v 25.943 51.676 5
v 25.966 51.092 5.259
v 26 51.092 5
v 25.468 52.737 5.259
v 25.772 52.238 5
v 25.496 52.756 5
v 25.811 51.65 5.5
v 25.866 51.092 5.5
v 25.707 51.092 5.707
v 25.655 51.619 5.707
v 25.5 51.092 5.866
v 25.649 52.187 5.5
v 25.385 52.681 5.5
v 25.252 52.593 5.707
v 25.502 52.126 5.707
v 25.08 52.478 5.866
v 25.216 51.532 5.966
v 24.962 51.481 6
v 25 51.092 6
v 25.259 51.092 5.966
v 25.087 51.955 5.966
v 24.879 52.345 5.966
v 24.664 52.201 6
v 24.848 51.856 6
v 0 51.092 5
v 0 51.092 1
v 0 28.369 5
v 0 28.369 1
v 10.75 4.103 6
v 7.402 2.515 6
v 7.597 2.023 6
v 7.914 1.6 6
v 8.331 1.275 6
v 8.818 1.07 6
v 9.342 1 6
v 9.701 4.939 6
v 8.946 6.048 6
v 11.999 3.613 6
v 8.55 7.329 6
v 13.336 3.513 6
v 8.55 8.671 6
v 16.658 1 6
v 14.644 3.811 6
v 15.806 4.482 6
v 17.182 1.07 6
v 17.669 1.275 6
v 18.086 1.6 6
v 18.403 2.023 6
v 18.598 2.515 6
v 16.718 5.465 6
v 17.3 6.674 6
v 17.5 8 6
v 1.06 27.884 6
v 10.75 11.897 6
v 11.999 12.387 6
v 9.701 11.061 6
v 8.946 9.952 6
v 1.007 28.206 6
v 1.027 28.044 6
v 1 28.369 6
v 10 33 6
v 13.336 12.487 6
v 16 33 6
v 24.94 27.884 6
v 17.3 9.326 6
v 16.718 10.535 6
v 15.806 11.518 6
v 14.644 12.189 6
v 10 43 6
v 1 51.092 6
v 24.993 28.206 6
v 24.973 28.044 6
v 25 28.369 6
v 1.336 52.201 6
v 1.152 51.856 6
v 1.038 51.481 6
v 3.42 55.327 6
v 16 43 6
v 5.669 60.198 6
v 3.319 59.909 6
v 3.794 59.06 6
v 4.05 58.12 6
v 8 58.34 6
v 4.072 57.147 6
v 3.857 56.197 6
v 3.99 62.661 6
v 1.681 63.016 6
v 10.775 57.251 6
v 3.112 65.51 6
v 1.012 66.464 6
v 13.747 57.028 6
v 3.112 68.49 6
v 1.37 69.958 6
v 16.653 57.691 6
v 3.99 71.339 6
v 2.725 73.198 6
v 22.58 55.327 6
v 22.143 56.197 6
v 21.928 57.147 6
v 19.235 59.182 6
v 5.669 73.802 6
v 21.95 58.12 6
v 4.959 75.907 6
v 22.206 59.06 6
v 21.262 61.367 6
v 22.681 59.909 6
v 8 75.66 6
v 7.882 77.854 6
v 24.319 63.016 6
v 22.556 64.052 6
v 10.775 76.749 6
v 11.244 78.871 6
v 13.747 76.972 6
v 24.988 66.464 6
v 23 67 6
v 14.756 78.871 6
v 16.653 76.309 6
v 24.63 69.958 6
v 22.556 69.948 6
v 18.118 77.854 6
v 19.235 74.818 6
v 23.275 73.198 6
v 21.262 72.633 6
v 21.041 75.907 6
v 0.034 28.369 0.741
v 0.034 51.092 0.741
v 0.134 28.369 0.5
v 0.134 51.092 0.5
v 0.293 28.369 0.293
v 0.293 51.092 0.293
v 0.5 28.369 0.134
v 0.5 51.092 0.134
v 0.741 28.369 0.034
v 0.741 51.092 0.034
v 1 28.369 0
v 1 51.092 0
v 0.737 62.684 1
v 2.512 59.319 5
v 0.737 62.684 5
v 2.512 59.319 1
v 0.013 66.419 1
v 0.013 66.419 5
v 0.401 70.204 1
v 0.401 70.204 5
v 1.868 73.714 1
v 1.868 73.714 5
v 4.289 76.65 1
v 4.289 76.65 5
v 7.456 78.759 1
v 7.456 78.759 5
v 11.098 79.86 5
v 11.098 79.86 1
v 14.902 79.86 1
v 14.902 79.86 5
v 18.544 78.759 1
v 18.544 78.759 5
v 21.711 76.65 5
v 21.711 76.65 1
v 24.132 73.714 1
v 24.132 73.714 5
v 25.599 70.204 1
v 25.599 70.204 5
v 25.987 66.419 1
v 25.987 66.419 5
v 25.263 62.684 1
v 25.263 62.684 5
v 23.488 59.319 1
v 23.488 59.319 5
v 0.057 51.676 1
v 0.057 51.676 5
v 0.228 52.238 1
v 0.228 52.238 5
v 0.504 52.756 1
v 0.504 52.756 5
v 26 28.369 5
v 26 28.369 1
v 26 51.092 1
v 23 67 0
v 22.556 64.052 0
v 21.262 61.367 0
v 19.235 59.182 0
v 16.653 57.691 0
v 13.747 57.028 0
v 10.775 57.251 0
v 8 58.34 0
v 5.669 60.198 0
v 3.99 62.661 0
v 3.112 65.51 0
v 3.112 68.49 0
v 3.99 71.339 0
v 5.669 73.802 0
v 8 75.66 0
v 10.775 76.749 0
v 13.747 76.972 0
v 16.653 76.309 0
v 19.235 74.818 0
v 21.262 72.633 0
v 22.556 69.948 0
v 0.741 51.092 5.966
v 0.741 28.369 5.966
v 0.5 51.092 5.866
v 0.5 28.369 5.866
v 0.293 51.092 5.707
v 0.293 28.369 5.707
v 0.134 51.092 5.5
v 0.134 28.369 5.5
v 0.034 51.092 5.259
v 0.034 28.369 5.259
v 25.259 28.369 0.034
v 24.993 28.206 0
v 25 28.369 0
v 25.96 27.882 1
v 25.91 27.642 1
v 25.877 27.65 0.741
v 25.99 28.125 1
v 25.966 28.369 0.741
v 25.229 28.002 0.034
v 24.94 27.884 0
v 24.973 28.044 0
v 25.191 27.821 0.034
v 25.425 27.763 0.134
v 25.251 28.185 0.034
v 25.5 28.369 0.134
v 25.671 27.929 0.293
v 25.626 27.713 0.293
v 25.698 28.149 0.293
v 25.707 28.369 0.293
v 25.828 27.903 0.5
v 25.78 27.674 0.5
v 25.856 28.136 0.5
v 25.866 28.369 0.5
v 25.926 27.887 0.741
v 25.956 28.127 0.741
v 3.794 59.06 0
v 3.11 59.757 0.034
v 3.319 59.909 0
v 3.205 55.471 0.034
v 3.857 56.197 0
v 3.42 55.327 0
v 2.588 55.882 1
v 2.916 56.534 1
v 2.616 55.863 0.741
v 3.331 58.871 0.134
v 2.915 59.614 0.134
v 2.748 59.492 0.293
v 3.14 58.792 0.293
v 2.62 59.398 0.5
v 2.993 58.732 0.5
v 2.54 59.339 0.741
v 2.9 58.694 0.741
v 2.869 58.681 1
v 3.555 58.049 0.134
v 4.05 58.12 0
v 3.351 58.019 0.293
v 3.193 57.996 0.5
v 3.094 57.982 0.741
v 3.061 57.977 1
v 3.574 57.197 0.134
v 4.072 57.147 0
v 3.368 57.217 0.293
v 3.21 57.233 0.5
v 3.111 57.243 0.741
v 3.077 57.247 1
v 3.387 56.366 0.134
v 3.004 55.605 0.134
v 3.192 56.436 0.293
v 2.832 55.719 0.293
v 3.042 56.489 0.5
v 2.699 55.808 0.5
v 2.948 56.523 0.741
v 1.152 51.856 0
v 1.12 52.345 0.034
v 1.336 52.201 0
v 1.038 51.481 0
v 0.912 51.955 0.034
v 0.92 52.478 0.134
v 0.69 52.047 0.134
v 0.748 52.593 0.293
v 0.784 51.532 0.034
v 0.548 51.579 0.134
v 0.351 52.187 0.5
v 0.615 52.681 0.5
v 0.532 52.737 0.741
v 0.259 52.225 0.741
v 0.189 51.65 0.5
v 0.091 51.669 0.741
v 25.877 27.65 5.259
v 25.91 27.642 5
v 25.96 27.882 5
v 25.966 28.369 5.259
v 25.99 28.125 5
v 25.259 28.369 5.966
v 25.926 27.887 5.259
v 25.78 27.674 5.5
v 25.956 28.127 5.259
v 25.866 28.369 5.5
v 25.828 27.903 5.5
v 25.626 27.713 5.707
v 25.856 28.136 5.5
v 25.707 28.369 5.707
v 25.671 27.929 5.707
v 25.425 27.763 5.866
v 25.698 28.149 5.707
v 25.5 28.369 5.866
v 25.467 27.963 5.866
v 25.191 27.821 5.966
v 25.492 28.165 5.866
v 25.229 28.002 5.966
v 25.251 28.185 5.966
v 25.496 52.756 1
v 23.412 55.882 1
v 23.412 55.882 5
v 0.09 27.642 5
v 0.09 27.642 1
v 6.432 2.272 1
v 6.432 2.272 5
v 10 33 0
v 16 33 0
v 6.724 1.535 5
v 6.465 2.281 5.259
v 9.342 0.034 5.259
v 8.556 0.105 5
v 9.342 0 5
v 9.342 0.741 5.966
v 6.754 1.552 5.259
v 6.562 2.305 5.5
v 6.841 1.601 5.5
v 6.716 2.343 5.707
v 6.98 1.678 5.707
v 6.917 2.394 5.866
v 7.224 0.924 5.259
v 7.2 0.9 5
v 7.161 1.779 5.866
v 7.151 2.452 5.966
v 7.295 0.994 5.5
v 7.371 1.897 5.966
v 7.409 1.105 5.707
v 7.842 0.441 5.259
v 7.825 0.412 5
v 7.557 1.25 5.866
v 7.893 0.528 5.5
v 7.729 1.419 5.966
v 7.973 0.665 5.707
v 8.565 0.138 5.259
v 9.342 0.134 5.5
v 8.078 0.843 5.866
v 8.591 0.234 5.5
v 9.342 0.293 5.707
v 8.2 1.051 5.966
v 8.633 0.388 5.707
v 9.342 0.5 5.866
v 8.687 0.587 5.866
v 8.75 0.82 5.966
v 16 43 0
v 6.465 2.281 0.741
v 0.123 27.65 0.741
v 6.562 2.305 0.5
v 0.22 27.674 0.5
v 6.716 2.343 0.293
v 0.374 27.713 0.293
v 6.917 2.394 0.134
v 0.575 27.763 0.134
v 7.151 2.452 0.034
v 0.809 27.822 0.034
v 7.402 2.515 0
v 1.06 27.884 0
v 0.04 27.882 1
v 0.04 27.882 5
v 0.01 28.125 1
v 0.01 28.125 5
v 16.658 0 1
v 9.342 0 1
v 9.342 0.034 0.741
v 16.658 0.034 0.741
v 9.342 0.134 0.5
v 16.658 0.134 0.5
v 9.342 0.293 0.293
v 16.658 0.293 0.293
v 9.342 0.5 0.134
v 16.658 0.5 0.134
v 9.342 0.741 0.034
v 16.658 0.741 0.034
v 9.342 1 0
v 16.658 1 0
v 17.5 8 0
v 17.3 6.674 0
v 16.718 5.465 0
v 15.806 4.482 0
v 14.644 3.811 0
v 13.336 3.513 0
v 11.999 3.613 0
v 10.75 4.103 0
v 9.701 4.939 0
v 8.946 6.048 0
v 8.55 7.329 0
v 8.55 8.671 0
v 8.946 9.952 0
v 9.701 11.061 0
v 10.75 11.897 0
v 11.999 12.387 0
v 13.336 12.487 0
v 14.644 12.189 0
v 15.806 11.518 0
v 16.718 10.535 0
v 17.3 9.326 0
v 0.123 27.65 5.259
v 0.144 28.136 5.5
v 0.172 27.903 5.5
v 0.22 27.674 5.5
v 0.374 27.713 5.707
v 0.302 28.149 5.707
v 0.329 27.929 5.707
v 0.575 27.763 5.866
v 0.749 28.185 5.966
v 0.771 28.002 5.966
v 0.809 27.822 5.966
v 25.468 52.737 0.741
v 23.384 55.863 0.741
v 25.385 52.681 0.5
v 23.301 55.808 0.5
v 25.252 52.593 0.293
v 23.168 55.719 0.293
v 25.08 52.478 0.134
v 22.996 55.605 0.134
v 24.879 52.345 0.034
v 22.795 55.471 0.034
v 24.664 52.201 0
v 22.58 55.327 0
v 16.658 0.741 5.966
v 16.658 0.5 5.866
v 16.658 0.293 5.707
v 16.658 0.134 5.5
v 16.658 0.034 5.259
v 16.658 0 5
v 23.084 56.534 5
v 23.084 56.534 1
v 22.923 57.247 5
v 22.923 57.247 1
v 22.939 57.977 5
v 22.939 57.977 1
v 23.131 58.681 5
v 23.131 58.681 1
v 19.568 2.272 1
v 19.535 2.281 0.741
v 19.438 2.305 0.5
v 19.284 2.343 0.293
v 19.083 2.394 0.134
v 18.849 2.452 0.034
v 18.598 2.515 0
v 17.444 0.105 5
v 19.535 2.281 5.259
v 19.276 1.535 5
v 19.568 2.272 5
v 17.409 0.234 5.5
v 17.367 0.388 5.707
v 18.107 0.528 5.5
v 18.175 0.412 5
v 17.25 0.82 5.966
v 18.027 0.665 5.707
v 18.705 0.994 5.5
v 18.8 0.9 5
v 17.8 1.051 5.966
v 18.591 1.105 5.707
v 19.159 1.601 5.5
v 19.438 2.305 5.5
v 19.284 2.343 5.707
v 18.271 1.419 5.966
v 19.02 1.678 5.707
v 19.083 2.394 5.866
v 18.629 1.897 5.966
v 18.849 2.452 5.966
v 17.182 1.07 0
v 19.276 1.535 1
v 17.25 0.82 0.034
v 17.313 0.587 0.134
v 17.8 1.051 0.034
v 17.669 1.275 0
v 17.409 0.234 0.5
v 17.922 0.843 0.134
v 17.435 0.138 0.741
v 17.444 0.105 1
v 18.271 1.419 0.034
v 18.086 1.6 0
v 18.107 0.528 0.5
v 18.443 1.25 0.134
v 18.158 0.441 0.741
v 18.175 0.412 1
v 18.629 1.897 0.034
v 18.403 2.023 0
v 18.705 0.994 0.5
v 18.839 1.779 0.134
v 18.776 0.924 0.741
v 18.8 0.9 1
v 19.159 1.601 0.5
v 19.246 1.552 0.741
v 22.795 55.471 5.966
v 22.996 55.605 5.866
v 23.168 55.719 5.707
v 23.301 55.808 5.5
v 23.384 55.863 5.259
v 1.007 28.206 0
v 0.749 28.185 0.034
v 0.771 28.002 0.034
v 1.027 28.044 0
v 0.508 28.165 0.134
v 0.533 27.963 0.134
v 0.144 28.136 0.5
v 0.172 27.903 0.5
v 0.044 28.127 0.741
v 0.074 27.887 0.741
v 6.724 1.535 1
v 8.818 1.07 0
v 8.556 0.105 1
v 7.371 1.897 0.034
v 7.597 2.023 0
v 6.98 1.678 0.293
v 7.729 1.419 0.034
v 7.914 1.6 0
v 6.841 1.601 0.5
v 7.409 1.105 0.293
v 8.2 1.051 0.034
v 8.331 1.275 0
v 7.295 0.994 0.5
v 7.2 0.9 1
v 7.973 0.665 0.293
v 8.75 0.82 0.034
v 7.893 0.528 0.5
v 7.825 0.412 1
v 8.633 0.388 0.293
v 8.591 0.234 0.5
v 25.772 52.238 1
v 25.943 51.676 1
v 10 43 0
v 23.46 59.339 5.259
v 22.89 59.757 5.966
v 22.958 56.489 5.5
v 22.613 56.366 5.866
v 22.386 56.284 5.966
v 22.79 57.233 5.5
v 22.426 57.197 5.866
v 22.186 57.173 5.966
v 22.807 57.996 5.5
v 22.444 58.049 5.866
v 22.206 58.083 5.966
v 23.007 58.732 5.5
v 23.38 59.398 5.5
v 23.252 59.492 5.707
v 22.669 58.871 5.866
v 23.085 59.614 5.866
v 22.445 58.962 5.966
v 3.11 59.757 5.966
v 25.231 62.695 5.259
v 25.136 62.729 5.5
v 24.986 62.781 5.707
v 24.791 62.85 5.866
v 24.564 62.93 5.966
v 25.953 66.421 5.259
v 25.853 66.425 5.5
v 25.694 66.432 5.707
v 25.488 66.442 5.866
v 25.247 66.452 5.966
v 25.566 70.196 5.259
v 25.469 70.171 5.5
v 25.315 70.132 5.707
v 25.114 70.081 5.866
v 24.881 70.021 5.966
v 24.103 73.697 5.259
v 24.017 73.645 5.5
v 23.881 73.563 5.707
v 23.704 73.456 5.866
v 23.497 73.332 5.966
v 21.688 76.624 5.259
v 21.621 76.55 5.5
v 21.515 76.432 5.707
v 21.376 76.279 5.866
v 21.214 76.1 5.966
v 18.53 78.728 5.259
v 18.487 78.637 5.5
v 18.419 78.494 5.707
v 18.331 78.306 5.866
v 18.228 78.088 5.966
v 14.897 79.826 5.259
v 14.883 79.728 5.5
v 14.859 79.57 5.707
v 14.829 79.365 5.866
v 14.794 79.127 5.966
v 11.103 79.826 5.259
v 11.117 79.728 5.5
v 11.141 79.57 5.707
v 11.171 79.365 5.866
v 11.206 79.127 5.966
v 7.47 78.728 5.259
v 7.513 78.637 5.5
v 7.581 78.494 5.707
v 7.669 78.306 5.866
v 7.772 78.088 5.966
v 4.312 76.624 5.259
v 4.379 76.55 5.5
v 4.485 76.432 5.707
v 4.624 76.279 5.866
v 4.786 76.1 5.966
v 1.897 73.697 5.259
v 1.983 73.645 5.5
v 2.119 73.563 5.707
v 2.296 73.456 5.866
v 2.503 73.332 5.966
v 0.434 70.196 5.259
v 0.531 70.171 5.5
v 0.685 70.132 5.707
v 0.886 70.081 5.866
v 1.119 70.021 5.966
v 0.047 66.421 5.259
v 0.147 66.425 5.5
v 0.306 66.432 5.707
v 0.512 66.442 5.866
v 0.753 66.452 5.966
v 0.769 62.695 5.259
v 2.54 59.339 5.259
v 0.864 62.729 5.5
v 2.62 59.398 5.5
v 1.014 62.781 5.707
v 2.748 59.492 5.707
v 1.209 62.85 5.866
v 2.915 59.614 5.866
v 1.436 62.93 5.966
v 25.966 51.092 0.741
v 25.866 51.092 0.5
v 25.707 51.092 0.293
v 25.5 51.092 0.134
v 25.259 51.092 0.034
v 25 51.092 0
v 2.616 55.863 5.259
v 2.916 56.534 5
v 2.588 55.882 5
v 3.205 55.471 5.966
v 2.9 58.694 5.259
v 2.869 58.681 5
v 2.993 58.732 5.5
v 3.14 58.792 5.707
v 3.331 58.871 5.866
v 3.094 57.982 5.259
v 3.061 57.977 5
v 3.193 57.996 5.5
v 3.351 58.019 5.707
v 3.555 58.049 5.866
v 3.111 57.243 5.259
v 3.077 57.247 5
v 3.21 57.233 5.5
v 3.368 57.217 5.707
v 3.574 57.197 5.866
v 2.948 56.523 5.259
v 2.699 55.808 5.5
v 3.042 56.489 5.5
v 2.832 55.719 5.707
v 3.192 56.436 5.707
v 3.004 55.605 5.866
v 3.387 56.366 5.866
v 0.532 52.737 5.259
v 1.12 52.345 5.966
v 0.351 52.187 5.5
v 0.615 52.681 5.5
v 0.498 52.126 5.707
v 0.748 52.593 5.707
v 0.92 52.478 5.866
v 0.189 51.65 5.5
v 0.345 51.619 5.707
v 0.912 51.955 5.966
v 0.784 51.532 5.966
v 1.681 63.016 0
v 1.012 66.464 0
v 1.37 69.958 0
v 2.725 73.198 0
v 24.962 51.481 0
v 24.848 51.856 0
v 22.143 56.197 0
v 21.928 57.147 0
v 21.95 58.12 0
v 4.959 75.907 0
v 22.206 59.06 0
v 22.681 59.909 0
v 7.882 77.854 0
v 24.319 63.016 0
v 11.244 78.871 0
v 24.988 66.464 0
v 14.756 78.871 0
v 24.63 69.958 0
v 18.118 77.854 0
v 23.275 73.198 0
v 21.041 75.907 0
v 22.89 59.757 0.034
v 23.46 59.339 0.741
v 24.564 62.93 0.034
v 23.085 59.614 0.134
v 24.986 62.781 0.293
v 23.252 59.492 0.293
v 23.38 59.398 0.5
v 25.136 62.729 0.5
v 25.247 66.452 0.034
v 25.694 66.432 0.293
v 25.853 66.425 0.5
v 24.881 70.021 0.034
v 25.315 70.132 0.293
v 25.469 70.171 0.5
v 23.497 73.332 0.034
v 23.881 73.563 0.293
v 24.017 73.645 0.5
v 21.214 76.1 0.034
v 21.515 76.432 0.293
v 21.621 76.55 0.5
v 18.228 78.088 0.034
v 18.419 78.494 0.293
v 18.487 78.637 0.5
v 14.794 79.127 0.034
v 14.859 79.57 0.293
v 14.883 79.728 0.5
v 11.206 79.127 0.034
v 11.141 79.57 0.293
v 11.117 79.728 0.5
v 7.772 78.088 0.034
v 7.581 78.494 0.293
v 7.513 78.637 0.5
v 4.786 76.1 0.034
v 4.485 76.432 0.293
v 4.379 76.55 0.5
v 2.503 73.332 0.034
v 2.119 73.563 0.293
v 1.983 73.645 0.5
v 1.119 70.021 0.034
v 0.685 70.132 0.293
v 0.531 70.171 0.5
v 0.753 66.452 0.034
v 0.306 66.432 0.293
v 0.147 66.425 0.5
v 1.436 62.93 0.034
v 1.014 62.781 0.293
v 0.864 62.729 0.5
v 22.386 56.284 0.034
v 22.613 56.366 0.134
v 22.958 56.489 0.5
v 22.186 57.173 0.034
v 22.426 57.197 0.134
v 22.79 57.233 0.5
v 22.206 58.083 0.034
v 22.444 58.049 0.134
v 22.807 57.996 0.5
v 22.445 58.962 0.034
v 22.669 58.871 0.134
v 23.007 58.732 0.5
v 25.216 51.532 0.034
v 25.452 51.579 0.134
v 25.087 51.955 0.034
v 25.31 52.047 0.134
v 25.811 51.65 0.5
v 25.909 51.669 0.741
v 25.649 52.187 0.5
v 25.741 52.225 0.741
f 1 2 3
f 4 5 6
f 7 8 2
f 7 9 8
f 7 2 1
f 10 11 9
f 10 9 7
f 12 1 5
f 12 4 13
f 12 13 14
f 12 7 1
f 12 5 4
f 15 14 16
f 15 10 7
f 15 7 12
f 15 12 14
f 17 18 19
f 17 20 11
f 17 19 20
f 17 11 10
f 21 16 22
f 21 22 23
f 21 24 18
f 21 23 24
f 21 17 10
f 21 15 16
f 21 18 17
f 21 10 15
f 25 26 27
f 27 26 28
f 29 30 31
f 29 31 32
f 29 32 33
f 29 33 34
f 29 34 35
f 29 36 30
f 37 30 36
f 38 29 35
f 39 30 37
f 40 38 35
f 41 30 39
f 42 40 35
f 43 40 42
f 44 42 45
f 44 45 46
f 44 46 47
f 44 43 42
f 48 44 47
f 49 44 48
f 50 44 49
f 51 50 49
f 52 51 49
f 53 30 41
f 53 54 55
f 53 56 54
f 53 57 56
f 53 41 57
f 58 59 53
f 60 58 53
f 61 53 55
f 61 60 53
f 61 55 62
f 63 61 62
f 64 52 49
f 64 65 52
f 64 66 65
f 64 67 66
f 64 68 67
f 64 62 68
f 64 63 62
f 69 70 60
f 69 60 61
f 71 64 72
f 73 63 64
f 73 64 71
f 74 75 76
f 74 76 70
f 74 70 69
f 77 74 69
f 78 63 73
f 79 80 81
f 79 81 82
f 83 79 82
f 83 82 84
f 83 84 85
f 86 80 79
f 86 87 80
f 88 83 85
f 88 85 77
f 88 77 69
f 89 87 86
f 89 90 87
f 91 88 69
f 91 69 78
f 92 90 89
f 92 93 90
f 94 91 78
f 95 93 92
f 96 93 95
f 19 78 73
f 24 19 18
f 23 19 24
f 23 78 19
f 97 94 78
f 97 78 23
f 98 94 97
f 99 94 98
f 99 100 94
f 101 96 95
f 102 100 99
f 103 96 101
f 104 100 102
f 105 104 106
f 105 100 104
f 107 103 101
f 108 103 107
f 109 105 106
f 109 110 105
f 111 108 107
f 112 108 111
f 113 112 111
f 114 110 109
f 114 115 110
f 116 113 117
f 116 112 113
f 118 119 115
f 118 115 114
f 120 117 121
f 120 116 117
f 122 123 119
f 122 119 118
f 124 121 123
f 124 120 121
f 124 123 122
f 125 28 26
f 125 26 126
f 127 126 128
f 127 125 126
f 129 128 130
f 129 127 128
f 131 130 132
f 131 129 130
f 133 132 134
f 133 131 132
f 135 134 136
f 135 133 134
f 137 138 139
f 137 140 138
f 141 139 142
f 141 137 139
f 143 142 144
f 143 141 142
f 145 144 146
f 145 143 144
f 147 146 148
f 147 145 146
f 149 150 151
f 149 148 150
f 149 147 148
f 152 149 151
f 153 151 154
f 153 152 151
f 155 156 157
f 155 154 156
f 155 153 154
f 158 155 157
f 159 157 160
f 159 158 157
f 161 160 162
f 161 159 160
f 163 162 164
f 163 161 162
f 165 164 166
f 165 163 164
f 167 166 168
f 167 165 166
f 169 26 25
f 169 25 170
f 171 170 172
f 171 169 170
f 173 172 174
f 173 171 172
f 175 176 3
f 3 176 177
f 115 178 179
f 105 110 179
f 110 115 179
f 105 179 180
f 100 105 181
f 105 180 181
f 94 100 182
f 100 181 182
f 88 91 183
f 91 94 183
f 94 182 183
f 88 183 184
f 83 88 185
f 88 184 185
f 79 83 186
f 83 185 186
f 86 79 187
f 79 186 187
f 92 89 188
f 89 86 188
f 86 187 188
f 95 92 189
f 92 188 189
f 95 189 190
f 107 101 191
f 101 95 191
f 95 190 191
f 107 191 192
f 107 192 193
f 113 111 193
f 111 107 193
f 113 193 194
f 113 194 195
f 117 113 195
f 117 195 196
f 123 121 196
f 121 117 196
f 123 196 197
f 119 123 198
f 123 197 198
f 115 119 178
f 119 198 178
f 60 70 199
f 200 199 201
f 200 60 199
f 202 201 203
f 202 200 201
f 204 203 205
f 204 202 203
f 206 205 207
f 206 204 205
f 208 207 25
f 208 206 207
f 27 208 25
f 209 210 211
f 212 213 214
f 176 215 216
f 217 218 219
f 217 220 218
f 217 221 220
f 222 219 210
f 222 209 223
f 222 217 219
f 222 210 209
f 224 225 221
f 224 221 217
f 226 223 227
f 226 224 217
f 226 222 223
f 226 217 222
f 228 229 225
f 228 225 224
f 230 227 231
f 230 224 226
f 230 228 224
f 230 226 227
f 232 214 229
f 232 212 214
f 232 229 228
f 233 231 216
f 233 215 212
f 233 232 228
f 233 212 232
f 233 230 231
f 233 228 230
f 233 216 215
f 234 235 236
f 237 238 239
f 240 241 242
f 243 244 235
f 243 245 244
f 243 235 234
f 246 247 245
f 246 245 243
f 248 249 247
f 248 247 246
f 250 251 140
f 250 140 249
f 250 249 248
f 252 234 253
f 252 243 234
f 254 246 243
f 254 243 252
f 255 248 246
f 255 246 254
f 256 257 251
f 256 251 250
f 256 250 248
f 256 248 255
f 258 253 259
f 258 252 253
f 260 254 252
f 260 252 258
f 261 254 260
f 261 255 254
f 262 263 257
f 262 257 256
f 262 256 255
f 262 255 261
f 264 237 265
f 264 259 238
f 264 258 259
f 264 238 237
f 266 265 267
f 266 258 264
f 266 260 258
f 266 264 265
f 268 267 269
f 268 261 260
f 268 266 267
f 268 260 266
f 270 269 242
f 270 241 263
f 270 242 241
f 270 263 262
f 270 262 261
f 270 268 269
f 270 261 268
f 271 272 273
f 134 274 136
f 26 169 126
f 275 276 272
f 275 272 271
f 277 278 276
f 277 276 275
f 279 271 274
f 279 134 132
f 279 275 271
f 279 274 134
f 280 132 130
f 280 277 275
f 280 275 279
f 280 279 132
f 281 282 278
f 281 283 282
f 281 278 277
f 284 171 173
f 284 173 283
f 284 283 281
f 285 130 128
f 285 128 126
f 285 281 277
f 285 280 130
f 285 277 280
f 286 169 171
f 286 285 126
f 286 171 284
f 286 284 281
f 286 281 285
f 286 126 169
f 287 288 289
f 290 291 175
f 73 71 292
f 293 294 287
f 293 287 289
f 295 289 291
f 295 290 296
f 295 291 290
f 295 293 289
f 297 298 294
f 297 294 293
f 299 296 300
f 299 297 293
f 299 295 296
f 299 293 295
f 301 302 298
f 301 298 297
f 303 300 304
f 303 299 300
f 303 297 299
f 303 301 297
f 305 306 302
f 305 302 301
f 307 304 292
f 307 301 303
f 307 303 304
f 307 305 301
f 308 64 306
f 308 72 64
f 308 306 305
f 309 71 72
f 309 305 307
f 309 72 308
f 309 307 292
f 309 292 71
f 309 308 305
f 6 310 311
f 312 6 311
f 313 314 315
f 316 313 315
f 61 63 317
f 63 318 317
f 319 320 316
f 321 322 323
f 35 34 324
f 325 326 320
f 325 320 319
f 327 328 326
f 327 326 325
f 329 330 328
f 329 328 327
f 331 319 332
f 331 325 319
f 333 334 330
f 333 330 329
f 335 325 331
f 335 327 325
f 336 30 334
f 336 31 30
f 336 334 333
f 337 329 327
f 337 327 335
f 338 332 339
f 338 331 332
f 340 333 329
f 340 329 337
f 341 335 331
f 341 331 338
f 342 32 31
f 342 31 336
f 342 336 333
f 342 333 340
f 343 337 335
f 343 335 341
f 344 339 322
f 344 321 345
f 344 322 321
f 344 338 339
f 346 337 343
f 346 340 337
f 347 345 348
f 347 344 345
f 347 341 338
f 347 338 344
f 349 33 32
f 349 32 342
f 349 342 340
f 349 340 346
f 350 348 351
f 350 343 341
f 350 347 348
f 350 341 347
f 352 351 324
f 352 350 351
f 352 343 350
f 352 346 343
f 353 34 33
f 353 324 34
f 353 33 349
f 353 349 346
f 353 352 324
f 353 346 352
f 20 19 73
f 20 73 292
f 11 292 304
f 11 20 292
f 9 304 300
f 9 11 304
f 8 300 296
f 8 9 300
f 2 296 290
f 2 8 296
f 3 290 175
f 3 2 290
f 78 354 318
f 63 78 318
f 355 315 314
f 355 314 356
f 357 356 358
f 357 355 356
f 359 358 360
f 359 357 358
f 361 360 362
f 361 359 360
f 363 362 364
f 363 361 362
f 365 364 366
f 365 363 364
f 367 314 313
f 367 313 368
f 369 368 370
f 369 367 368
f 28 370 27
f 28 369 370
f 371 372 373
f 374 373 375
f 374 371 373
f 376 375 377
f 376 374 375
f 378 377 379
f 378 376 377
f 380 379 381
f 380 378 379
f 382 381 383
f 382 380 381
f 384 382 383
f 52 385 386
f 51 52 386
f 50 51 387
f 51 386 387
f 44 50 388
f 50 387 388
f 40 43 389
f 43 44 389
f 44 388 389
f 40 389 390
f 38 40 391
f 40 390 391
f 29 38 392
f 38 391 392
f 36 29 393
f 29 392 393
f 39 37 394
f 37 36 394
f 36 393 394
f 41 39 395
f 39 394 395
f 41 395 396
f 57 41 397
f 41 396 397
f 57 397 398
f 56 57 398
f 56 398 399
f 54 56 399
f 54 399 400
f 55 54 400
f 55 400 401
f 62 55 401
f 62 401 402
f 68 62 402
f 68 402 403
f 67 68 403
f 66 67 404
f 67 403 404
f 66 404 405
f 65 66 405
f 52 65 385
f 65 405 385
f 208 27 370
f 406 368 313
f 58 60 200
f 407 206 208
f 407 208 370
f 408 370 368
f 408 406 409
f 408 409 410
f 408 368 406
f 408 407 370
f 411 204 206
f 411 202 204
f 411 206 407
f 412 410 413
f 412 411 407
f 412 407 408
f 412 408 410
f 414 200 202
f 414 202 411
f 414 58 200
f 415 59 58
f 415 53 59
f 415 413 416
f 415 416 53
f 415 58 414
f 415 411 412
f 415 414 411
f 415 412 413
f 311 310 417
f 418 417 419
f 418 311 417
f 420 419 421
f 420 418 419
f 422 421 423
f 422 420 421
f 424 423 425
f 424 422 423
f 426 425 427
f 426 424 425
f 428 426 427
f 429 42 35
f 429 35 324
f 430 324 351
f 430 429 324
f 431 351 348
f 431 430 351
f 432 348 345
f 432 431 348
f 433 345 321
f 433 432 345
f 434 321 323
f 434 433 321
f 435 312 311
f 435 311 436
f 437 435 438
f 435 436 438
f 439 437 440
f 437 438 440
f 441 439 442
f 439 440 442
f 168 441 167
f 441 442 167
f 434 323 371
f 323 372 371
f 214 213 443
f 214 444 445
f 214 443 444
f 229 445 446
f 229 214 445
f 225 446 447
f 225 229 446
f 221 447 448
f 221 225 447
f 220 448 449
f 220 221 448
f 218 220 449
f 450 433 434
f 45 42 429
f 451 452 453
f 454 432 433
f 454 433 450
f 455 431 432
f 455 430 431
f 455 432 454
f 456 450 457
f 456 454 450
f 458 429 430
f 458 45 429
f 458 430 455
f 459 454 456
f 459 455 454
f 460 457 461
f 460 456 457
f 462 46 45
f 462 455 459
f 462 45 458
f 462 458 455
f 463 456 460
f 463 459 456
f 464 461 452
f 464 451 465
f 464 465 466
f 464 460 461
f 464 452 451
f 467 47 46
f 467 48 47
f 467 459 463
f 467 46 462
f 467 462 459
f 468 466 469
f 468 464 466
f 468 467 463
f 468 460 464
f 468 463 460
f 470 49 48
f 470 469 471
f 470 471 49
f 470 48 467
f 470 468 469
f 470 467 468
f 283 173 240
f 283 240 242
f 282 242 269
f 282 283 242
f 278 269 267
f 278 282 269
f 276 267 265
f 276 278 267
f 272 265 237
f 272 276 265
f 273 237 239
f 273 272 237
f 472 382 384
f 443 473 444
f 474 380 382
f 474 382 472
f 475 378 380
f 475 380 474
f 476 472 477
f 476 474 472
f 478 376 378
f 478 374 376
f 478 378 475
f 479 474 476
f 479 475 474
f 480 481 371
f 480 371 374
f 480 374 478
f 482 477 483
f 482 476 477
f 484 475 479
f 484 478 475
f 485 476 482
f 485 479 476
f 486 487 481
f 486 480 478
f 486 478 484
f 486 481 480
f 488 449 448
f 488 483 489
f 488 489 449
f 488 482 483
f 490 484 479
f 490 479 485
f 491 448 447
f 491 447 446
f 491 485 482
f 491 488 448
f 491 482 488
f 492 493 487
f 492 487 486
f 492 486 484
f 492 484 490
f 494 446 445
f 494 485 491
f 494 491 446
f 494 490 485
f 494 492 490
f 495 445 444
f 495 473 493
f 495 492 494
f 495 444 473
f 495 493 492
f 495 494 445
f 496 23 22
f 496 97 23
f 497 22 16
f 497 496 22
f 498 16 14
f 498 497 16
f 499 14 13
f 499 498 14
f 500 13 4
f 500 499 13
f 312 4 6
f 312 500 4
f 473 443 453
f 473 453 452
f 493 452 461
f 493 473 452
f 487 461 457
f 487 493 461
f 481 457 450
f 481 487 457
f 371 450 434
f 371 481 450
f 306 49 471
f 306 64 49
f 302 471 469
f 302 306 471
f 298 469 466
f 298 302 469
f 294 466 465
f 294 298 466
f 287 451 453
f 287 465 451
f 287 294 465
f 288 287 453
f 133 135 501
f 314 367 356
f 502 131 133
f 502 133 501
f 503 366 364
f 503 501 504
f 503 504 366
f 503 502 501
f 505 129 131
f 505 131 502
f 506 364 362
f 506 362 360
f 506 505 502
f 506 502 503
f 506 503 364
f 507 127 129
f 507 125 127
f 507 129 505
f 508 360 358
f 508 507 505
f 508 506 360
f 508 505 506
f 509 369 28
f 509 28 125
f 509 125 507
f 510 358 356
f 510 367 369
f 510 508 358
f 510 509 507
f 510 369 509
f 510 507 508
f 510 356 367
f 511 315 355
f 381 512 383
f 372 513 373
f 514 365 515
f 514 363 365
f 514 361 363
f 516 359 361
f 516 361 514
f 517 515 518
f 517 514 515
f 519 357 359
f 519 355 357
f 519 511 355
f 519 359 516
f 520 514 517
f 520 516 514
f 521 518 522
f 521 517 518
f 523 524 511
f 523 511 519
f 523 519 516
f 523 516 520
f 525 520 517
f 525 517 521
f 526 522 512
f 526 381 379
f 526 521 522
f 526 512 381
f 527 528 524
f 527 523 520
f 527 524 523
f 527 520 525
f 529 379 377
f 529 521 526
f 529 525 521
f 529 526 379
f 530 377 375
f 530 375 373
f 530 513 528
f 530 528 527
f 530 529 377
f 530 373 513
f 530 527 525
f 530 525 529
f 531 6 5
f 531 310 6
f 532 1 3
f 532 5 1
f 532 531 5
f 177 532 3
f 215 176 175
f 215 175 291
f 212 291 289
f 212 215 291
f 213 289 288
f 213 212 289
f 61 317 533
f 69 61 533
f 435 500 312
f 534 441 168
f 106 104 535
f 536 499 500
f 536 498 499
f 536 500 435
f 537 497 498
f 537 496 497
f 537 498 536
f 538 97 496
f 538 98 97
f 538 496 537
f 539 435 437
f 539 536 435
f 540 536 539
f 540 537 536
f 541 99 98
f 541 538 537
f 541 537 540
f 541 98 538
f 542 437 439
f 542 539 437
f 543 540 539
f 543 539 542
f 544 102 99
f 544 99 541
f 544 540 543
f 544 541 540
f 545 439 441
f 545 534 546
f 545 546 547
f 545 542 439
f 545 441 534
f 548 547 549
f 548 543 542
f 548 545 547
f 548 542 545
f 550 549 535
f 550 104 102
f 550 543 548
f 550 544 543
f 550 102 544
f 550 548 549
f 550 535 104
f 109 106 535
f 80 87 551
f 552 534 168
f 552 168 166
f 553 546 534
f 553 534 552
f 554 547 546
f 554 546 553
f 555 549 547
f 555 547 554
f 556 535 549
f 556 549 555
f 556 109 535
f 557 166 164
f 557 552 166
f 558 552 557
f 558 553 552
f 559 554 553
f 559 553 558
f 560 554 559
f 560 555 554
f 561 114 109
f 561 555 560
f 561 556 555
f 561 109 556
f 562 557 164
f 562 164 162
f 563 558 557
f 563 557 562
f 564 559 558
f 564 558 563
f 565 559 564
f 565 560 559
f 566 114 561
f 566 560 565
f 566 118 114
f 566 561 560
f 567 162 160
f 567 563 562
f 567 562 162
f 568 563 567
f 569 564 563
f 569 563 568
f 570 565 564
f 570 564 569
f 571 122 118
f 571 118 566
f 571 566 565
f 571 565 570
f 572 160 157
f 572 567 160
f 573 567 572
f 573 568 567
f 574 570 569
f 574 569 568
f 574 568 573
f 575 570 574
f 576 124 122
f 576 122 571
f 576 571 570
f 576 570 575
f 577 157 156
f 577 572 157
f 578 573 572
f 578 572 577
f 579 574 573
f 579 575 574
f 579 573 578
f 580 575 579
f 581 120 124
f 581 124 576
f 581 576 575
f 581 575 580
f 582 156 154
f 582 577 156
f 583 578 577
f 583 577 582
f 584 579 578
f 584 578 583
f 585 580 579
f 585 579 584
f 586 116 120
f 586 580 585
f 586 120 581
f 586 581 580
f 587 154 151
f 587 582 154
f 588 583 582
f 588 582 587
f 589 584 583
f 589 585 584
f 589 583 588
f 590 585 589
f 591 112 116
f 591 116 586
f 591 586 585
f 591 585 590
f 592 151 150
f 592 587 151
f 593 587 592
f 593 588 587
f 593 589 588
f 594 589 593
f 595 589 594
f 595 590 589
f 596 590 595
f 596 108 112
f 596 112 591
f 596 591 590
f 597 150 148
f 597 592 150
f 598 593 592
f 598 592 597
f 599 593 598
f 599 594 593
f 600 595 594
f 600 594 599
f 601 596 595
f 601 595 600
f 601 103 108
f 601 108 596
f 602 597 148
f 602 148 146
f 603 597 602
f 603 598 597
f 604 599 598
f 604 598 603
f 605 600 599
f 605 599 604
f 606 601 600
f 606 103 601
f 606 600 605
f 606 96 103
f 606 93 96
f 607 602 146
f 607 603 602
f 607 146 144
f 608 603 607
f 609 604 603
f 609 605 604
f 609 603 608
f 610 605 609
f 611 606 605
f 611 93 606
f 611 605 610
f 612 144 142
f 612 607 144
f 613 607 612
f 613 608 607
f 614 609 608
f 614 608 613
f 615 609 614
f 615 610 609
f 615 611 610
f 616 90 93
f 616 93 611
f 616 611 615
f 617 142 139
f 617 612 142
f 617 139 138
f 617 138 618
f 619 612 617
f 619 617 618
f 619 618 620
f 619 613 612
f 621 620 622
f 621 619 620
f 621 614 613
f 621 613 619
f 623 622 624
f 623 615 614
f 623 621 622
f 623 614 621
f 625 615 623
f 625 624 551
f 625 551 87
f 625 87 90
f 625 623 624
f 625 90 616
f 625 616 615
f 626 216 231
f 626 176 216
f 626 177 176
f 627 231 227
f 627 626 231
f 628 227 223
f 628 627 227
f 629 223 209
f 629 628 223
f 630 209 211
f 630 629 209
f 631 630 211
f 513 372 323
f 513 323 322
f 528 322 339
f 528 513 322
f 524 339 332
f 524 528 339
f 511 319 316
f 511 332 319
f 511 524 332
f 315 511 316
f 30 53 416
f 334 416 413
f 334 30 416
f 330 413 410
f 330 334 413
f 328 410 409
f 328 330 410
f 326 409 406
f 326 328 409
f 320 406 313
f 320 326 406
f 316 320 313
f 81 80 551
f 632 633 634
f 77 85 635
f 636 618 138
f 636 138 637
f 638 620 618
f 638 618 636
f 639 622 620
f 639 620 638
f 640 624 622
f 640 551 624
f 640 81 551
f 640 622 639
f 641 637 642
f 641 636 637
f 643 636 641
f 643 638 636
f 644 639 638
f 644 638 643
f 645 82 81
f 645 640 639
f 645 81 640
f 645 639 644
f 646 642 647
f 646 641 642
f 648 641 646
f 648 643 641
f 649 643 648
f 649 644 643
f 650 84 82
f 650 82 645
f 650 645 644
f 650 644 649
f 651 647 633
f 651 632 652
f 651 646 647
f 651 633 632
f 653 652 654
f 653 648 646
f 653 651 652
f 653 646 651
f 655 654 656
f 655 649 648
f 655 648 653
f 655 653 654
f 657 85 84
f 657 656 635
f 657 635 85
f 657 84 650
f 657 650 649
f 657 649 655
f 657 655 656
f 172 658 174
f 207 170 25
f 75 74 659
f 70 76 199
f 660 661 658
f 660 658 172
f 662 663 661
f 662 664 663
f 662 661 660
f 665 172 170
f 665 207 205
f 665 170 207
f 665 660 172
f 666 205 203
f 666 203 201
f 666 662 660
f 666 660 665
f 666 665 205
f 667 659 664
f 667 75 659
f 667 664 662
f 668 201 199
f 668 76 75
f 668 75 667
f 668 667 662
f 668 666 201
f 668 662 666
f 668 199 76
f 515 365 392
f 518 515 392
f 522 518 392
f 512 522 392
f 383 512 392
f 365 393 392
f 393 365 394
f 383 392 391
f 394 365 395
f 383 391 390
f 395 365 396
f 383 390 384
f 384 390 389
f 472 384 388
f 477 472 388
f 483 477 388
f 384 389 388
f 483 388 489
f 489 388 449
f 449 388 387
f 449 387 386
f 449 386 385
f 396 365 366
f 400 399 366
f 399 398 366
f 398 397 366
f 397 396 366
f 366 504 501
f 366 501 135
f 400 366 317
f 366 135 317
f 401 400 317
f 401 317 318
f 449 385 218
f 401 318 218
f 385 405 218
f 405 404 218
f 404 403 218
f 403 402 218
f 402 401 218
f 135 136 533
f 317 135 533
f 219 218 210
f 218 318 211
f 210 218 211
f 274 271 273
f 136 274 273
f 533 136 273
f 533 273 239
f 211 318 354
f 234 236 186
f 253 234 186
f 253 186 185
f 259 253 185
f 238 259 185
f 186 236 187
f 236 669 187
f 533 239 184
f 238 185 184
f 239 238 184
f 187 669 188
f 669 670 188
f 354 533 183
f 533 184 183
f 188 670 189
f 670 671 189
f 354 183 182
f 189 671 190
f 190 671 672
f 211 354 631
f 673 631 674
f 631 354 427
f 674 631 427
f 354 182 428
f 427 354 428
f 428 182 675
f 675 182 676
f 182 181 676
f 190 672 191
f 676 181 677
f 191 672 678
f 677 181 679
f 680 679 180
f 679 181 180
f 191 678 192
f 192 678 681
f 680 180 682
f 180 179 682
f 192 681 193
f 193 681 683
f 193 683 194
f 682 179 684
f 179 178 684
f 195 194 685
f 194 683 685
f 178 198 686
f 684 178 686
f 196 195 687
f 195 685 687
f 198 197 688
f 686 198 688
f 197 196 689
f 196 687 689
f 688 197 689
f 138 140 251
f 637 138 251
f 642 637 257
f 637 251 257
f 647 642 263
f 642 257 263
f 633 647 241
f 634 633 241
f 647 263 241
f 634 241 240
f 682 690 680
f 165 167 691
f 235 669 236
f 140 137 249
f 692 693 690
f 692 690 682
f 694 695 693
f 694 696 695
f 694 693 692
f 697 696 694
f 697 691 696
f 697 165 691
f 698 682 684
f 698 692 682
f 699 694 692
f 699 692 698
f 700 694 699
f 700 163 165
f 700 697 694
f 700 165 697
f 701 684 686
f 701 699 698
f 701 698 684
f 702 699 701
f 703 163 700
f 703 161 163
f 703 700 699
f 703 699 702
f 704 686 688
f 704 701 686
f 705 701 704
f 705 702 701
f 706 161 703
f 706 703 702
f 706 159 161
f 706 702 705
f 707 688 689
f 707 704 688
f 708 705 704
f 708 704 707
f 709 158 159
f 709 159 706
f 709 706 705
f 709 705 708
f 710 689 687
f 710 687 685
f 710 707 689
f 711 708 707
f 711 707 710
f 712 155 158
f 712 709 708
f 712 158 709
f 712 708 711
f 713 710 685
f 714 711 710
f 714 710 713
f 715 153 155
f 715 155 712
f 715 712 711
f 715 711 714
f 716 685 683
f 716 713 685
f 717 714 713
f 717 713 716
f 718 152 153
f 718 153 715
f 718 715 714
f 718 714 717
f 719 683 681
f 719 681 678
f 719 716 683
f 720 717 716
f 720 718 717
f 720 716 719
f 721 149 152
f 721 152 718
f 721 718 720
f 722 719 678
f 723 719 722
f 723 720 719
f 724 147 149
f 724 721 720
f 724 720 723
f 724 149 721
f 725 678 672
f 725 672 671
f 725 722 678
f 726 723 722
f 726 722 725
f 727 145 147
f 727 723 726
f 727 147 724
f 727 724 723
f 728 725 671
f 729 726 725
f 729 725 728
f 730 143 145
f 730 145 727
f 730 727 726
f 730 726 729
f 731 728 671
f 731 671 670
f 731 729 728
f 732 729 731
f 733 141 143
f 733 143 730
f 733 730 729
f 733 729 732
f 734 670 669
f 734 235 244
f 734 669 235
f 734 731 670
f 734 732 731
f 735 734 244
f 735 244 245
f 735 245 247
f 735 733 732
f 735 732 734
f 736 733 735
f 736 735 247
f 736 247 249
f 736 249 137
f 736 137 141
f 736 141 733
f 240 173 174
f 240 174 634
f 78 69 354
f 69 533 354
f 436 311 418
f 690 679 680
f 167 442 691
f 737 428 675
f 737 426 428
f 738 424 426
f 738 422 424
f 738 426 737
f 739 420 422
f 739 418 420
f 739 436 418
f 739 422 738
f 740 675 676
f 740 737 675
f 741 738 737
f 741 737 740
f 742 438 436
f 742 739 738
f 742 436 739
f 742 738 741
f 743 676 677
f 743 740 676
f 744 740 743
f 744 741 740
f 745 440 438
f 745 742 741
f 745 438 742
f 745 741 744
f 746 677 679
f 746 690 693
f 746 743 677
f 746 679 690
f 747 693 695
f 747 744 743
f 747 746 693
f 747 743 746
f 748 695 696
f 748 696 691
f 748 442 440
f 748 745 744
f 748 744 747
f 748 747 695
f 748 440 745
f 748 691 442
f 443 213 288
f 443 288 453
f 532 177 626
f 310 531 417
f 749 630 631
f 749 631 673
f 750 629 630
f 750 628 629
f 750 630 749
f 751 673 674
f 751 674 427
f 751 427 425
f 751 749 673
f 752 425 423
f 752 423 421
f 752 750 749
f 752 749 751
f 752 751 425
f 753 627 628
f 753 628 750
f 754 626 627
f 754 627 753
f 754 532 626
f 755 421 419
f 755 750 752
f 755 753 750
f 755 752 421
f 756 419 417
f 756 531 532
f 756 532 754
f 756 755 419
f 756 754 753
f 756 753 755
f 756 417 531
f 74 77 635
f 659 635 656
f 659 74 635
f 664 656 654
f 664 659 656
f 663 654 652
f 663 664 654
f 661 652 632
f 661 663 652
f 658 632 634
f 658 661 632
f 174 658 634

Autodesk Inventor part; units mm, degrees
ref_plane "YZ Plane" through (0, 0, 0) normal (1, 0, 0) x (0, 1, 0)
ref_plane "XZ Plane" through (0, 0, 0) normal (0, 1, 0) x (-1, 0, 0)
ref_plane "XY Plane" through (0, 0, 0) normal (0, 0, 1) x (1, 0, 0)
sketch "Náčrt1" plane through (0, 0, 0) normal (0, 0, 1) x (1, 0, 0)
  line L0 (9.3423, 0) -> (16.6577, 0)
  line L1 (26, 28.3693) -> (26, 51.0917)
  line L2 (0, 51.0917) -> (0, 28.3693)
  circle A0 centre (13, 67) radius 10
  arc A1 (23.4879, 59.3186) -> (2.5121, 59.3186) centre (13, 67) ccw
  circle A2 centre (13, 8) radius 4.5
  line L3 (10, 43) -> (16, 43)
  line L4 (16, 43) -> (16, 33)
  line L5 (16, 33) -> (10, 33)
  line L6 (10, 33) -> (10, 43)
  line L7 (26, 51.0917) -> (26, 28.3693)
  line L8 (0, 28.3693) -> (0, 51.0917)
  line L9 (0.0896, 27.6417) -> (6.4319, 2.2724)
  line L10 (25.9104, 27.6417) -> (19.5681, 2.2724)
  line L11 (25.4962, 52.7558) -> (23.4121, 55.8819)
  line L12 (0.5038, 52.7558) -> (2.5879, 55.8819)
  arc A3 (6.4319, 2.2724) -> (9.3423, 0) centre (9.3423, 3) ccw
  arc A4 (16.6577, 0) -> (19.5681, 2.2724) centre (16.6577, 3) ccw
  arc A5 (0.5038, 52.7558) -> (0, 51.0917) centre (3, 51.0917) ccw
  arc A6 (26, 51.0917) -> (25.4962, 52.7558) centre (23, 51.0917) ccw
  arc A7 (23.4879, 59.3186) -> (23.4121, 55.8819) centre (25.9082, 57.546) ccw
  arc A8 (2.5879, 55.8819) -> (2.5121, 59.3186) centre (0.0918, 57.546) ccw
  arc A9 (25.9104, 27.6417) -> (26, 28.3693) centre (23, 28.3693) ccw
  arc A10 (0, 28.3693) -> (0.0896, 27.6417) centre (3, 28.3693) ccw
  point P0 (0, 0)
  point P1 (13, 38)
  point P2 (13, 38)
  point P3 (22.1538, 57.7692)
  point P4 (3.8462, 57.7692)
  dimension "d4" = 3
  dimension "d11" = 20
extrude "Vysunutí1" add sketch "Náčrt1" along normal blind 6
fillet "Zaoblení1" radius 1 16 edges at (25.8713, 51.961, 6) (24.4541, 54.3188, 6) (22.9089, 57.6122, 6) (13, 80, 6) (3.0911, 57.6122, 6) (1.5459, 54.3188, 6) (0.1287, 51.961, 6) (0, 39.7305, 6) (0.0225, 28.0028, 6) (3.2607, 14.9571, 6) (7.4961, 0.6354, 6) (13, 0, 6) (18.5039, 0.6354, 6) (22.7393, 14.9571, 6) (25.9775, 28.0028, 6) (26, 39.7305, 6)
fillet "Zaoblení2" radius 1 16 edges at (25.8713, 51.961, 0) (24.4541, 54.3188, 0) (22.9089, 57.6122, 0) (13, 80, 0) (3.0911, 57.6122, 0) (1.5459, 54.3188, 0) (0.1287, 51.961, 0) (0, 39.7305, 0) (0.0225, 28.0028, 0) (3.2607, 14.9571, 0) (7.4961, 0.6354, 0) (13, 0, 0) (18.5039, 0.6354, 0) (22.7393, 14.9571, 0) (25.9775, 28.0028, 0) (26, 39.7305, 0)
properties part number "crossguard"
